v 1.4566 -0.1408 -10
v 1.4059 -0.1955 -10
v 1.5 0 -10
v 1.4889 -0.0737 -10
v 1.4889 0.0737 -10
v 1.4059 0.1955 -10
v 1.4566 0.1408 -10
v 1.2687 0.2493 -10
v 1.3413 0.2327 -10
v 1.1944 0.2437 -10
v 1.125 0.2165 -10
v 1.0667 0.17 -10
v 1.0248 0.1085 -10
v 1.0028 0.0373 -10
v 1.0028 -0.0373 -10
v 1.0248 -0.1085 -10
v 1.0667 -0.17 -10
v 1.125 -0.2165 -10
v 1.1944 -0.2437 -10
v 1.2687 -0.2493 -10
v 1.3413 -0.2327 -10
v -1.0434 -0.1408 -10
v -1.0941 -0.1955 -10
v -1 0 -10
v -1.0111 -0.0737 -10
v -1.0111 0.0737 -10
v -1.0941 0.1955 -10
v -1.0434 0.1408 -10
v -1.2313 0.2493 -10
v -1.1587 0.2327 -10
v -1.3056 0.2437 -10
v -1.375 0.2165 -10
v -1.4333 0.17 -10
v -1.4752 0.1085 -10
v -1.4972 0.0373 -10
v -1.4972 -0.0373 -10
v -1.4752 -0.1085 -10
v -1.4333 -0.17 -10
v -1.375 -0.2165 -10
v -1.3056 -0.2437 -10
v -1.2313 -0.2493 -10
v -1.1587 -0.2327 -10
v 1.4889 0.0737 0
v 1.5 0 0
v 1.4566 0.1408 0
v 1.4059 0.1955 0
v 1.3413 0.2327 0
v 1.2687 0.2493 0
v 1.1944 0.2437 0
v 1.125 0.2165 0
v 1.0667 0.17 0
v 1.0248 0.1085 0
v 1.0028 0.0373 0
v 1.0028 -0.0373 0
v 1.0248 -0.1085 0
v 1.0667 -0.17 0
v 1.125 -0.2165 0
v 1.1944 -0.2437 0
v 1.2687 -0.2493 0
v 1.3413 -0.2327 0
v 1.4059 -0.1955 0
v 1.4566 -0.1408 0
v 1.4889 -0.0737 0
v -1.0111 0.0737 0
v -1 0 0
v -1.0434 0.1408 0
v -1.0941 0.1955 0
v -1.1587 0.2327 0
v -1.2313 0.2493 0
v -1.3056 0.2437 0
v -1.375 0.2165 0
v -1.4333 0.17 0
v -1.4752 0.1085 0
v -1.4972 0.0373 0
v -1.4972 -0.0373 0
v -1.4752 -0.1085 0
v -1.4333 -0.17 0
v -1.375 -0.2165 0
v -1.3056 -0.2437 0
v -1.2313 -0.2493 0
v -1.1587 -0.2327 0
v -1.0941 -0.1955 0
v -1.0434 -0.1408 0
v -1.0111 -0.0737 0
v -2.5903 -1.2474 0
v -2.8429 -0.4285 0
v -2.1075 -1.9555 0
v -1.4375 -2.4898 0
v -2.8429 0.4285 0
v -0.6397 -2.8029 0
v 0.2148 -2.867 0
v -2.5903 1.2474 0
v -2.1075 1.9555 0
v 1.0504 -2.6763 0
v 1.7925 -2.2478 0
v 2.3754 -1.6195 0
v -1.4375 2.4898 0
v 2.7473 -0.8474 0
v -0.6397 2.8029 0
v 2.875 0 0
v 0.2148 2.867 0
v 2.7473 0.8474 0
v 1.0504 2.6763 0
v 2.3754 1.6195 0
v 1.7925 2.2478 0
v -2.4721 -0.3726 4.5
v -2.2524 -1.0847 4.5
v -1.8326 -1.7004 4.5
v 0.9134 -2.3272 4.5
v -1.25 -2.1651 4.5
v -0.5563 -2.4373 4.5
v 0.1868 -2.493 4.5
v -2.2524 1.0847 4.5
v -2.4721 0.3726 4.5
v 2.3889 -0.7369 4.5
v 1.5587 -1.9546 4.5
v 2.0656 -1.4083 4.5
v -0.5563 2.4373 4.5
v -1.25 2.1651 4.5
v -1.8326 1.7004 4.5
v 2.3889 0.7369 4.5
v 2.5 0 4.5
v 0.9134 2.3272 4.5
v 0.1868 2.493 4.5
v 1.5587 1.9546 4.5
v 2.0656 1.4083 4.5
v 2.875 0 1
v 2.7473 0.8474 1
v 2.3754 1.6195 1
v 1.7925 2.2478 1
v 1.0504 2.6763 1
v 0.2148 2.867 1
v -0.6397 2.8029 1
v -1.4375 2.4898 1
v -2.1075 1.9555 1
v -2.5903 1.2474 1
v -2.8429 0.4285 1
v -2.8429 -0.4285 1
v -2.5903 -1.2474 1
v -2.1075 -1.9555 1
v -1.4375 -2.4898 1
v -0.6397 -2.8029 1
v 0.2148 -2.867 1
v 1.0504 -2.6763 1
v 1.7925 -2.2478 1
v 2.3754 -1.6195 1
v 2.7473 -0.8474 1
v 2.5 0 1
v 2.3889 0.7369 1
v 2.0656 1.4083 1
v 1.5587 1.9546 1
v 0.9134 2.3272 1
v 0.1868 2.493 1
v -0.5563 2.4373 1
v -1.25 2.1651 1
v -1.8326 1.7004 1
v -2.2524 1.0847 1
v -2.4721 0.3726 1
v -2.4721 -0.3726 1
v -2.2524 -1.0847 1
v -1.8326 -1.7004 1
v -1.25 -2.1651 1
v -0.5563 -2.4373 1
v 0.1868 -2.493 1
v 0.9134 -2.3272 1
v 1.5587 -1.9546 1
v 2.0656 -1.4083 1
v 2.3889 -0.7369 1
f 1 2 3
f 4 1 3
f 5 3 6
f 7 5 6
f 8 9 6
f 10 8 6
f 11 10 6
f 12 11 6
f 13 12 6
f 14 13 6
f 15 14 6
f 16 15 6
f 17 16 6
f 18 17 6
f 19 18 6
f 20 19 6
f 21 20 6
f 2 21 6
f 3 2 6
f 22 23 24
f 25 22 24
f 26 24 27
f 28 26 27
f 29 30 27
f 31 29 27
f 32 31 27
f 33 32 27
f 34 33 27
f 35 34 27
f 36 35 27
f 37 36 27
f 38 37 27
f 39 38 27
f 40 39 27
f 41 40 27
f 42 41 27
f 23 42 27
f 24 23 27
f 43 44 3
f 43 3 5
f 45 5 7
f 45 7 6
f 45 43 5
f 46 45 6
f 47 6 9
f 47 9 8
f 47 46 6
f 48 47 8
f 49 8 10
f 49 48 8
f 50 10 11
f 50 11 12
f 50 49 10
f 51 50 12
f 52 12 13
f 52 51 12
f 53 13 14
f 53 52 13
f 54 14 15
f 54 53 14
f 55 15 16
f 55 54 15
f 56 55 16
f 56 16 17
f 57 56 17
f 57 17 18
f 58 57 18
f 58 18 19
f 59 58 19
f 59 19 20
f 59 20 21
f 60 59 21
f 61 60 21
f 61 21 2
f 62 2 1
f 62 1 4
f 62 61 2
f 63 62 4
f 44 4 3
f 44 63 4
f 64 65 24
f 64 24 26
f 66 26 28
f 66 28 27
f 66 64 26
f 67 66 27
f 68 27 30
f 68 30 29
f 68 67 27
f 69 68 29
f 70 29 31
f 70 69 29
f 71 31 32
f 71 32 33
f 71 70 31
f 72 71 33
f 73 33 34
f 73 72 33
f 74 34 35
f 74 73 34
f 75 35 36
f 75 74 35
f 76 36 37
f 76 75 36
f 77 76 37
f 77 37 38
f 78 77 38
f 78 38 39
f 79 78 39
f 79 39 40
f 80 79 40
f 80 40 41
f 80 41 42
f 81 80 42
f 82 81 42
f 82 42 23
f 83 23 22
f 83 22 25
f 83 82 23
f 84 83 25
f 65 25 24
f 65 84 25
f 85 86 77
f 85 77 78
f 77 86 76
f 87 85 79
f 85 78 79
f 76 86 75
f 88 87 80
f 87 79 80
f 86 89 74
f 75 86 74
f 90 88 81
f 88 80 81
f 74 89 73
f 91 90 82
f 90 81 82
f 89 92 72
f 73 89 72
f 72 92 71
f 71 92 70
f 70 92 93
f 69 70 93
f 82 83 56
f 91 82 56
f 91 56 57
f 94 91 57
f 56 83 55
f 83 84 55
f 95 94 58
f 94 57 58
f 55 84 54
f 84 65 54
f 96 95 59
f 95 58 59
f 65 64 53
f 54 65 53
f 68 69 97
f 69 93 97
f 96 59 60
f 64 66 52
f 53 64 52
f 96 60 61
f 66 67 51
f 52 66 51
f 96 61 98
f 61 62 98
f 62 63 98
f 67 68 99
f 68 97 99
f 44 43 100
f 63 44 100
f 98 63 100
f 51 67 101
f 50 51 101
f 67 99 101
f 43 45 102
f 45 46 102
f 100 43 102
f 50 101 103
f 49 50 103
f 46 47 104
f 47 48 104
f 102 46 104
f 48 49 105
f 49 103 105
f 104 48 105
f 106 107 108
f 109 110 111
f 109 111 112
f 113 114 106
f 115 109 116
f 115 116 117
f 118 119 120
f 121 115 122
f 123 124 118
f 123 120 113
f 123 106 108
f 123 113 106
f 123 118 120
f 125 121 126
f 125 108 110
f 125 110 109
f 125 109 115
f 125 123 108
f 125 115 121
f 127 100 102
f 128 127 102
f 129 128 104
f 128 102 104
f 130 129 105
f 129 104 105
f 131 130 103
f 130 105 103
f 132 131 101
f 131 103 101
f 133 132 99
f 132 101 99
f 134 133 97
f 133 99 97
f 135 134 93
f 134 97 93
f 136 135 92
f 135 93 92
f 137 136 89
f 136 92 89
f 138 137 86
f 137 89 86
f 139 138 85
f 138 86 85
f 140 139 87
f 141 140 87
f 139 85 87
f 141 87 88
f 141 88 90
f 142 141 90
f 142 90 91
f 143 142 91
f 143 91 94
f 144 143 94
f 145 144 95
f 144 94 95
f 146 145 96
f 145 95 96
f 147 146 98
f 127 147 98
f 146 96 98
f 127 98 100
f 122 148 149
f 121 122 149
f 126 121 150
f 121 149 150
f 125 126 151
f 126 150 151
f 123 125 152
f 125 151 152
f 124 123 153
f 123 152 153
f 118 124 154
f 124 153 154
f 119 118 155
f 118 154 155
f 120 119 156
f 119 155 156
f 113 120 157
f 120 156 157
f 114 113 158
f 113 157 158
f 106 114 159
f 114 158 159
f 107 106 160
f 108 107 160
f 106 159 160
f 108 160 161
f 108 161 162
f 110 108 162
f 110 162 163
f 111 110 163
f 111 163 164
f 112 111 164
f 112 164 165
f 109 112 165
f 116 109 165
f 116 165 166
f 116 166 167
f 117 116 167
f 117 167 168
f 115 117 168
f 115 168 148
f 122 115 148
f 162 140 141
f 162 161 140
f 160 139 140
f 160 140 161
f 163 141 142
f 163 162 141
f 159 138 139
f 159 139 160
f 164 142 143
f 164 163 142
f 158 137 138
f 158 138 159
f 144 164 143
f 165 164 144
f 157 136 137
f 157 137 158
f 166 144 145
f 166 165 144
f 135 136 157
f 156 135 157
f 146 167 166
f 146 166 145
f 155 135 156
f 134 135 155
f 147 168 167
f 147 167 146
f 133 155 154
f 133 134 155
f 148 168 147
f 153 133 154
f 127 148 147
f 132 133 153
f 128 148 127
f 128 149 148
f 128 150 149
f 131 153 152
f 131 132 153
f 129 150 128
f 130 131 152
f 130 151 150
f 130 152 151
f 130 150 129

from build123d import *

# Parameters (mm, degrees)
F0_R     = 2.5
F0_R_2   = 0.25
F1_DEPTH = 4.5
F0_R_3   = 2.875
F2_DEPTH = 1
F3_DEPTH = 10


with BuildPart() as f1:
    # F0 (on Top) → F1 (new body)
    with BuildSketch(Plane.XY):
        Circle(F0_R)
        with Locations((-1.25, 0)):
            Circle(F0_R_2, mode=Mode.SUBTRACT)
        with Locations((1.25, 0)):
            Circle(F0_R_2, mode=Mode.SUBTRACT)
        with Locations((-1.25, 0)):
            Circle(F0_R_2)
        with Locations((1.25, 0)):
            Circle(F0_R_2)
    extrude(amount=F1_DEPTH)

    # F0 (on Top) → F2 (join)
    with BuildSketch(Plane.XY):
        Circle(F0_R_3)
        Circle(F0_R, mode=Mode.SUBTRACT)
    extrude(amount=F2_DEPTH)

    # F0 (on Top) → F3 (join)
    with BuildSketch(Plane.XY):
        with Locations((-1.25, 0)):
            Circle(F0_R_2)
        with Locations((1.25, 0)):
            Circle(F0_R_2)
    extrude(amount=-F3_DEPTH)


solid = f1.part
